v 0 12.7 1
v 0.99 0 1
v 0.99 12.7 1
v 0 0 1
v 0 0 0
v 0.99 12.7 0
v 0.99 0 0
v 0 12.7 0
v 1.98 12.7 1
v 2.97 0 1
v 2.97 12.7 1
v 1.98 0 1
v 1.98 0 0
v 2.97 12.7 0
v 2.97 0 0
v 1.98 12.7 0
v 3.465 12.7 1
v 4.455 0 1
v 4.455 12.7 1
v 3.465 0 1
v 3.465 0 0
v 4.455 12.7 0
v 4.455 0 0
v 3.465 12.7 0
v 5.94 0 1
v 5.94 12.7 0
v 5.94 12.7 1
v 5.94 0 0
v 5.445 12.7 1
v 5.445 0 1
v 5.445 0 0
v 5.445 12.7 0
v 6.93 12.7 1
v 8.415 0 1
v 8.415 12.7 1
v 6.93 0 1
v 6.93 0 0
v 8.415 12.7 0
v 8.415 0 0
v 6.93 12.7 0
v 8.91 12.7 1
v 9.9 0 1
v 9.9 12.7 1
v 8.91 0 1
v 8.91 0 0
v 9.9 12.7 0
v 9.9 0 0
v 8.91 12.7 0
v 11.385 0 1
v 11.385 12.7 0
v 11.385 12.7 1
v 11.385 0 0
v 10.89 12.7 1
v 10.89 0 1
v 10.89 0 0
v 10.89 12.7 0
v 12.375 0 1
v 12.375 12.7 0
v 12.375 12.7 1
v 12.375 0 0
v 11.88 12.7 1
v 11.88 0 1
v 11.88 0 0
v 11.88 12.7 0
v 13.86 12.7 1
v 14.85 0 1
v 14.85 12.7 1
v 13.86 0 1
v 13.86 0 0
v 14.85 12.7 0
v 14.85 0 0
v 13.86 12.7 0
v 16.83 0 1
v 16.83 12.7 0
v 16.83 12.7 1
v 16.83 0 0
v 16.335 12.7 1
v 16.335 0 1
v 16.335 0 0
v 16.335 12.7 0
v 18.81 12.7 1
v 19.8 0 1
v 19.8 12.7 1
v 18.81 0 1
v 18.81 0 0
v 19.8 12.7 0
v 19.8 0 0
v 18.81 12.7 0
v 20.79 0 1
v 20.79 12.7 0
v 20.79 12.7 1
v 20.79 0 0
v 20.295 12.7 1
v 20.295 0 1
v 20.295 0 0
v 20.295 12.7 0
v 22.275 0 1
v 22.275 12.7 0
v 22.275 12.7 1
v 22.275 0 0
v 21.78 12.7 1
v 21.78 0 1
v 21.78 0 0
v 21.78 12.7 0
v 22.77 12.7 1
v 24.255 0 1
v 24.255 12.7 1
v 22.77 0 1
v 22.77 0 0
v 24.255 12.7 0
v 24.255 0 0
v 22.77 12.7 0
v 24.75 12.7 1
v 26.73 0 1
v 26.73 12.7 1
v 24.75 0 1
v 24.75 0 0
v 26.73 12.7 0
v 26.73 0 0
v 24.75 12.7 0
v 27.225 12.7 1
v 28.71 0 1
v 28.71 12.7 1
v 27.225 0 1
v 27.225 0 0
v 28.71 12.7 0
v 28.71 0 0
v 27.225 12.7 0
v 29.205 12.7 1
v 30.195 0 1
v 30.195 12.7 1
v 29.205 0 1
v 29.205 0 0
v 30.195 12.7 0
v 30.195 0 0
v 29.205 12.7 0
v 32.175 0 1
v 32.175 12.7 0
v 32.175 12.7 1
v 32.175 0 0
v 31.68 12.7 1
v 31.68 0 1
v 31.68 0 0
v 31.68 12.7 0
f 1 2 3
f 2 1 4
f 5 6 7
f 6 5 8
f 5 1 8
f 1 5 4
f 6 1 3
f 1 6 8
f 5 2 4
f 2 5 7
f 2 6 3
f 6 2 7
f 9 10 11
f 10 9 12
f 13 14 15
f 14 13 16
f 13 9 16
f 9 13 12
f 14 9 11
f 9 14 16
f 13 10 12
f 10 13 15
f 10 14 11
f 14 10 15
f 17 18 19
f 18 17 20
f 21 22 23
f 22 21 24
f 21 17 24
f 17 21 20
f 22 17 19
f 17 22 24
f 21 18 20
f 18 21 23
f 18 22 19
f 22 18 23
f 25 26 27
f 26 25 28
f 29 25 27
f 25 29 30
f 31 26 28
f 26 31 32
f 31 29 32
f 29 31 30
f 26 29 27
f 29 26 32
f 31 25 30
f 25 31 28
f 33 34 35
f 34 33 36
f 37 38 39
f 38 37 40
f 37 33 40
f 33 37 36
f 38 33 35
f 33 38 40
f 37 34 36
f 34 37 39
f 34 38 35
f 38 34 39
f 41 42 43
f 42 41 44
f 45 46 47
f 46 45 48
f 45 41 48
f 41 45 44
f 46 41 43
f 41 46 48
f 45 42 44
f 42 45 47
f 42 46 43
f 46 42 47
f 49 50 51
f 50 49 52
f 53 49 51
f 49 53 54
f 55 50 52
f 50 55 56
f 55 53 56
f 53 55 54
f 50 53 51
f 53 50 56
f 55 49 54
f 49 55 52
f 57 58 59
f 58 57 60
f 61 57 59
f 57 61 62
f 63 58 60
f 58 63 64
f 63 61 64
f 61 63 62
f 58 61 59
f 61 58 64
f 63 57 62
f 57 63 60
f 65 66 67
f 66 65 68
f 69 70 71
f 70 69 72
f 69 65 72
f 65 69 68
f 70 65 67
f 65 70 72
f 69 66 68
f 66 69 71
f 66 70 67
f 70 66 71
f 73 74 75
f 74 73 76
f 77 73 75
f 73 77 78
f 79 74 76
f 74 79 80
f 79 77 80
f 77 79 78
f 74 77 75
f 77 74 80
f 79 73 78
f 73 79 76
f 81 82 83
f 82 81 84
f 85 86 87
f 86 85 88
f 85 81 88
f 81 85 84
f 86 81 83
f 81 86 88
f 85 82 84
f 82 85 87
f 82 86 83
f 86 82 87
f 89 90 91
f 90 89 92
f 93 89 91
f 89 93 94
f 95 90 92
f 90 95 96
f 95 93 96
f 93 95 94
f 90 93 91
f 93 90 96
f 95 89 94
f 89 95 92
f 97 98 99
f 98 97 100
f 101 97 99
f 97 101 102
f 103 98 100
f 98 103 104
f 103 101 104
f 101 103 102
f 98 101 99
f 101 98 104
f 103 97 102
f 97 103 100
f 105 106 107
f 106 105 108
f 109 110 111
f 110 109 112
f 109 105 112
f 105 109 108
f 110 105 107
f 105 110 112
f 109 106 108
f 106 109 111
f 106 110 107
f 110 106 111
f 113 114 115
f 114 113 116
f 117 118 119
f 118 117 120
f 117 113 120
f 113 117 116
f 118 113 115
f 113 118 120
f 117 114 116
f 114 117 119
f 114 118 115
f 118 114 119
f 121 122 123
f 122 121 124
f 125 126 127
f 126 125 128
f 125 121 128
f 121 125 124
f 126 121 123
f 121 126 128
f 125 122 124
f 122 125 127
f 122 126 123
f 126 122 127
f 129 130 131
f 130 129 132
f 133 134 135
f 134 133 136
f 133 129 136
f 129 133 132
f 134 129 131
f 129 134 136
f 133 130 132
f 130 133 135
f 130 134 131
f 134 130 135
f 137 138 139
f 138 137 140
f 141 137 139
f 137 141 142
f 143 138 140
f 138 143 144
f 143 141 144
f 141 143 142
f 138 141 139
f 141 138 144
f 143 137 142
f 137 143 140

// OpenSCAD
// file: ../../util/bitmap.scad
/*****************************************************************************
 * Module Bitmap Library
 * Modules to create bitmaps of unit squares from 1 or 2 dimensional vectors.
 *****************************************************************************
 * Copyright 2017 Chris Baker
 *
 * This program is free software: you can redistribute it and/or modify
 * it under the terms of the GNU Lesser General Public License as published by
 * the Free Software Foundation, either version 3 of the License, or
 * (at your option) any later version.
 *
 * This program is distributed in the hope that it will be useful,
 * but WITHOUT ANY WARRANTY; without even the implied warranty of
 * MERCHANTABILITY or FITNESS FOR A PARTICULAR PURPOSE.  See the
 * GNU Lesser General Public License for more details.
 *
 * You should have received a copy of the GNU Lesser General Public License
 * along with this program.  If not, see <http://www.gnu.org/licenses/>.
 *****************************************************************************
 * Usage:
 * Include this file with the "use" tag.
 * Depends on compat.scad library.
 *
 * API:
 *   1dbitmap(bitmap, center, expansion, vector_mode)
 *   2dbitmap(bitmap, center, expansion, vector_mode)
 *     Generate a 1 or 2-Dimensional field of modules based on the provided
 *     bitmap vector. See Bitmap Vectors below.
 *     The center flag determines whether to center the bitmap on the origin.
 *     The expansion value actually shrinks each cube in the x and y
 *     dimension by the specified amount.
 *     The vector_mode flag determines whether to create 3D solid geometry
 *     (unit cubes) or 2D vector geometry (squares).
 *
 * Bitmap Vectors:
 *   The bitmap vectors primarily provide boolean information.
 *   A module will be placed where these vectors have a postive value and
 *   skipped where they have a negative value. I.E. 0, -1, false, and undef
 *   are all equivalent and result in a skip. 1 and true are equivalent and
 *   result in a placed 1-unit module.
 *   Further, if the value is an integer it will be treated as a height for
 *   the module, allowing z-maps to be created.
 *   If the value is not an integer or boolean, it will be treated as a color
 *   reference. This can be a string or RGBA vector that will be used to
 *   color the module in the OpenSCAD preview window.
 *   In current versions of OpenSCAD, the color has no effect in the rendered
 *   view or STL output.
 *
 * Vector Mode:
 *   Although OpenSCAD supports generating 2D geometry, there are several
 *   caveats:
 *   - 2D and 3D geometry cannot be mixed
 *   - Extruding 2D geometry causes color information to be lost
 *   - All 2D geometry is projected onto the XY plane when rendering
 *   - Rendering also results in loss of color (same as 3D)
 *   - The SVG exporter is somewhat limited:
 *     - The pixel size of the image is hard-coded in the file
 *     - The title of the image is a generic string
 *     - The color selection for stroke and fill is fixed
 *     - The stroke-width is set to a large value that will cause overlap
 *     - The background is transparent
 *     - Only one path element is created with all of the geometry; there is
 *       no easy way to split up the geometry into multiple logical units.
 *     - These issues can mostly be resolved by hand-editing the file:
 *       - Remove or modify the width and height parameters from the svg
 *         element at the top of the file to provide better scaling.
 *       - Edit the title element at the top of the file to change the title.
 *       - Edit the stroke and fill parameters of the path element (these will
 *         probably be at the end of the file).
 *       - Set the stroke-width parameter for the path element to 0.
 *****************************************************************************/
use <compat.scad>

/*
 * 2dbitmap - Turn a 2D vector into a bitmap of cubes
 *
 * bitmap - 2D vector representing where to place each cube
 *          Value can either be boolean, z-height, or color
 * center - center cubes around the origin
 * expansion - size of gap around each pixel (screendoor)
 * vector_mode - create a 2D vector drawing instead of 3D extrusion
 */
module 2dbitmap(bitmap=[[1,0],[0,1]], center=false, expansion=0, vector_mode=false)
{
	ylen=len(bitmap)-1;

	for (y=[0:ylen]) {
		xlen=len(bitmap[y])-1;
		for (x=[0:xlen])
			translate([x-(center?xlen/2:0),ylen-y-(center?ylen/2:0),0])
				if (is_indexable(bitmap[y][x]))
					color(bitmap[y][x])
						if (vector_mode)
							square([1-expansion,1-expansion], center=center);
						else
							cube([1-expansion,1-expansion,1], center=center);
				else
					if (bitmap[y][x])
						if (vector_mode)
							square([1-expansion,1-expansion], center=center);
						else
							cube([1-expansion,1-expansion,clamp_nonnum(bitmap[y][x])], center=center);
	}
}

module 1dbitmap(bitmap=[1,0,1,0,1], center=false, expansion=0, vector_mode=false)
	2dbitmap([bitmap], center, expansion, vector_mode);

/*
 * Examples
 */

// 1D with z-height
translate([10,0,0]) scale([1,10,1])
	1dbitmap(bitmap=[1,1,0,2,0,0,3], expansion=.1);

// 1D with boolean
translate([-20,0,0]) scale([1,10,1])
	1dbitmap(bitmap=[true,false,true,false,true,true]);

// 2D with z-height
scale([2,2,1])
	2dbitmap(bitmap=[[1,0,2,1],[0,3,3,0],[1,1,0,1]],
		center=true);

// 1D with color
translate([0,-10,0]) scale([1,3,1])
	1dbitmap(bitmap=["red","white","blue",[0,0.3,0,0.5]]);

// 1D with color using 2D-vector-mode
translate([-7,-8,0]) scale([1,2])
	1dbitmap(bitmap=["red",0,"blue",0,"green"], vector_mode=true);
translate([-4.5,-10,0]) scale([1,2])
	1dbitmap(bitmap=["red",0,"blue",0,"green"], vector_mode=true, center=true);
// main file
/* Unit Test 12: Expert mode - missing start symbols */
use <../code128.scad>

code_128([1, 16, 33, 73, 99, 58], bar="black", expert_mode=true);
